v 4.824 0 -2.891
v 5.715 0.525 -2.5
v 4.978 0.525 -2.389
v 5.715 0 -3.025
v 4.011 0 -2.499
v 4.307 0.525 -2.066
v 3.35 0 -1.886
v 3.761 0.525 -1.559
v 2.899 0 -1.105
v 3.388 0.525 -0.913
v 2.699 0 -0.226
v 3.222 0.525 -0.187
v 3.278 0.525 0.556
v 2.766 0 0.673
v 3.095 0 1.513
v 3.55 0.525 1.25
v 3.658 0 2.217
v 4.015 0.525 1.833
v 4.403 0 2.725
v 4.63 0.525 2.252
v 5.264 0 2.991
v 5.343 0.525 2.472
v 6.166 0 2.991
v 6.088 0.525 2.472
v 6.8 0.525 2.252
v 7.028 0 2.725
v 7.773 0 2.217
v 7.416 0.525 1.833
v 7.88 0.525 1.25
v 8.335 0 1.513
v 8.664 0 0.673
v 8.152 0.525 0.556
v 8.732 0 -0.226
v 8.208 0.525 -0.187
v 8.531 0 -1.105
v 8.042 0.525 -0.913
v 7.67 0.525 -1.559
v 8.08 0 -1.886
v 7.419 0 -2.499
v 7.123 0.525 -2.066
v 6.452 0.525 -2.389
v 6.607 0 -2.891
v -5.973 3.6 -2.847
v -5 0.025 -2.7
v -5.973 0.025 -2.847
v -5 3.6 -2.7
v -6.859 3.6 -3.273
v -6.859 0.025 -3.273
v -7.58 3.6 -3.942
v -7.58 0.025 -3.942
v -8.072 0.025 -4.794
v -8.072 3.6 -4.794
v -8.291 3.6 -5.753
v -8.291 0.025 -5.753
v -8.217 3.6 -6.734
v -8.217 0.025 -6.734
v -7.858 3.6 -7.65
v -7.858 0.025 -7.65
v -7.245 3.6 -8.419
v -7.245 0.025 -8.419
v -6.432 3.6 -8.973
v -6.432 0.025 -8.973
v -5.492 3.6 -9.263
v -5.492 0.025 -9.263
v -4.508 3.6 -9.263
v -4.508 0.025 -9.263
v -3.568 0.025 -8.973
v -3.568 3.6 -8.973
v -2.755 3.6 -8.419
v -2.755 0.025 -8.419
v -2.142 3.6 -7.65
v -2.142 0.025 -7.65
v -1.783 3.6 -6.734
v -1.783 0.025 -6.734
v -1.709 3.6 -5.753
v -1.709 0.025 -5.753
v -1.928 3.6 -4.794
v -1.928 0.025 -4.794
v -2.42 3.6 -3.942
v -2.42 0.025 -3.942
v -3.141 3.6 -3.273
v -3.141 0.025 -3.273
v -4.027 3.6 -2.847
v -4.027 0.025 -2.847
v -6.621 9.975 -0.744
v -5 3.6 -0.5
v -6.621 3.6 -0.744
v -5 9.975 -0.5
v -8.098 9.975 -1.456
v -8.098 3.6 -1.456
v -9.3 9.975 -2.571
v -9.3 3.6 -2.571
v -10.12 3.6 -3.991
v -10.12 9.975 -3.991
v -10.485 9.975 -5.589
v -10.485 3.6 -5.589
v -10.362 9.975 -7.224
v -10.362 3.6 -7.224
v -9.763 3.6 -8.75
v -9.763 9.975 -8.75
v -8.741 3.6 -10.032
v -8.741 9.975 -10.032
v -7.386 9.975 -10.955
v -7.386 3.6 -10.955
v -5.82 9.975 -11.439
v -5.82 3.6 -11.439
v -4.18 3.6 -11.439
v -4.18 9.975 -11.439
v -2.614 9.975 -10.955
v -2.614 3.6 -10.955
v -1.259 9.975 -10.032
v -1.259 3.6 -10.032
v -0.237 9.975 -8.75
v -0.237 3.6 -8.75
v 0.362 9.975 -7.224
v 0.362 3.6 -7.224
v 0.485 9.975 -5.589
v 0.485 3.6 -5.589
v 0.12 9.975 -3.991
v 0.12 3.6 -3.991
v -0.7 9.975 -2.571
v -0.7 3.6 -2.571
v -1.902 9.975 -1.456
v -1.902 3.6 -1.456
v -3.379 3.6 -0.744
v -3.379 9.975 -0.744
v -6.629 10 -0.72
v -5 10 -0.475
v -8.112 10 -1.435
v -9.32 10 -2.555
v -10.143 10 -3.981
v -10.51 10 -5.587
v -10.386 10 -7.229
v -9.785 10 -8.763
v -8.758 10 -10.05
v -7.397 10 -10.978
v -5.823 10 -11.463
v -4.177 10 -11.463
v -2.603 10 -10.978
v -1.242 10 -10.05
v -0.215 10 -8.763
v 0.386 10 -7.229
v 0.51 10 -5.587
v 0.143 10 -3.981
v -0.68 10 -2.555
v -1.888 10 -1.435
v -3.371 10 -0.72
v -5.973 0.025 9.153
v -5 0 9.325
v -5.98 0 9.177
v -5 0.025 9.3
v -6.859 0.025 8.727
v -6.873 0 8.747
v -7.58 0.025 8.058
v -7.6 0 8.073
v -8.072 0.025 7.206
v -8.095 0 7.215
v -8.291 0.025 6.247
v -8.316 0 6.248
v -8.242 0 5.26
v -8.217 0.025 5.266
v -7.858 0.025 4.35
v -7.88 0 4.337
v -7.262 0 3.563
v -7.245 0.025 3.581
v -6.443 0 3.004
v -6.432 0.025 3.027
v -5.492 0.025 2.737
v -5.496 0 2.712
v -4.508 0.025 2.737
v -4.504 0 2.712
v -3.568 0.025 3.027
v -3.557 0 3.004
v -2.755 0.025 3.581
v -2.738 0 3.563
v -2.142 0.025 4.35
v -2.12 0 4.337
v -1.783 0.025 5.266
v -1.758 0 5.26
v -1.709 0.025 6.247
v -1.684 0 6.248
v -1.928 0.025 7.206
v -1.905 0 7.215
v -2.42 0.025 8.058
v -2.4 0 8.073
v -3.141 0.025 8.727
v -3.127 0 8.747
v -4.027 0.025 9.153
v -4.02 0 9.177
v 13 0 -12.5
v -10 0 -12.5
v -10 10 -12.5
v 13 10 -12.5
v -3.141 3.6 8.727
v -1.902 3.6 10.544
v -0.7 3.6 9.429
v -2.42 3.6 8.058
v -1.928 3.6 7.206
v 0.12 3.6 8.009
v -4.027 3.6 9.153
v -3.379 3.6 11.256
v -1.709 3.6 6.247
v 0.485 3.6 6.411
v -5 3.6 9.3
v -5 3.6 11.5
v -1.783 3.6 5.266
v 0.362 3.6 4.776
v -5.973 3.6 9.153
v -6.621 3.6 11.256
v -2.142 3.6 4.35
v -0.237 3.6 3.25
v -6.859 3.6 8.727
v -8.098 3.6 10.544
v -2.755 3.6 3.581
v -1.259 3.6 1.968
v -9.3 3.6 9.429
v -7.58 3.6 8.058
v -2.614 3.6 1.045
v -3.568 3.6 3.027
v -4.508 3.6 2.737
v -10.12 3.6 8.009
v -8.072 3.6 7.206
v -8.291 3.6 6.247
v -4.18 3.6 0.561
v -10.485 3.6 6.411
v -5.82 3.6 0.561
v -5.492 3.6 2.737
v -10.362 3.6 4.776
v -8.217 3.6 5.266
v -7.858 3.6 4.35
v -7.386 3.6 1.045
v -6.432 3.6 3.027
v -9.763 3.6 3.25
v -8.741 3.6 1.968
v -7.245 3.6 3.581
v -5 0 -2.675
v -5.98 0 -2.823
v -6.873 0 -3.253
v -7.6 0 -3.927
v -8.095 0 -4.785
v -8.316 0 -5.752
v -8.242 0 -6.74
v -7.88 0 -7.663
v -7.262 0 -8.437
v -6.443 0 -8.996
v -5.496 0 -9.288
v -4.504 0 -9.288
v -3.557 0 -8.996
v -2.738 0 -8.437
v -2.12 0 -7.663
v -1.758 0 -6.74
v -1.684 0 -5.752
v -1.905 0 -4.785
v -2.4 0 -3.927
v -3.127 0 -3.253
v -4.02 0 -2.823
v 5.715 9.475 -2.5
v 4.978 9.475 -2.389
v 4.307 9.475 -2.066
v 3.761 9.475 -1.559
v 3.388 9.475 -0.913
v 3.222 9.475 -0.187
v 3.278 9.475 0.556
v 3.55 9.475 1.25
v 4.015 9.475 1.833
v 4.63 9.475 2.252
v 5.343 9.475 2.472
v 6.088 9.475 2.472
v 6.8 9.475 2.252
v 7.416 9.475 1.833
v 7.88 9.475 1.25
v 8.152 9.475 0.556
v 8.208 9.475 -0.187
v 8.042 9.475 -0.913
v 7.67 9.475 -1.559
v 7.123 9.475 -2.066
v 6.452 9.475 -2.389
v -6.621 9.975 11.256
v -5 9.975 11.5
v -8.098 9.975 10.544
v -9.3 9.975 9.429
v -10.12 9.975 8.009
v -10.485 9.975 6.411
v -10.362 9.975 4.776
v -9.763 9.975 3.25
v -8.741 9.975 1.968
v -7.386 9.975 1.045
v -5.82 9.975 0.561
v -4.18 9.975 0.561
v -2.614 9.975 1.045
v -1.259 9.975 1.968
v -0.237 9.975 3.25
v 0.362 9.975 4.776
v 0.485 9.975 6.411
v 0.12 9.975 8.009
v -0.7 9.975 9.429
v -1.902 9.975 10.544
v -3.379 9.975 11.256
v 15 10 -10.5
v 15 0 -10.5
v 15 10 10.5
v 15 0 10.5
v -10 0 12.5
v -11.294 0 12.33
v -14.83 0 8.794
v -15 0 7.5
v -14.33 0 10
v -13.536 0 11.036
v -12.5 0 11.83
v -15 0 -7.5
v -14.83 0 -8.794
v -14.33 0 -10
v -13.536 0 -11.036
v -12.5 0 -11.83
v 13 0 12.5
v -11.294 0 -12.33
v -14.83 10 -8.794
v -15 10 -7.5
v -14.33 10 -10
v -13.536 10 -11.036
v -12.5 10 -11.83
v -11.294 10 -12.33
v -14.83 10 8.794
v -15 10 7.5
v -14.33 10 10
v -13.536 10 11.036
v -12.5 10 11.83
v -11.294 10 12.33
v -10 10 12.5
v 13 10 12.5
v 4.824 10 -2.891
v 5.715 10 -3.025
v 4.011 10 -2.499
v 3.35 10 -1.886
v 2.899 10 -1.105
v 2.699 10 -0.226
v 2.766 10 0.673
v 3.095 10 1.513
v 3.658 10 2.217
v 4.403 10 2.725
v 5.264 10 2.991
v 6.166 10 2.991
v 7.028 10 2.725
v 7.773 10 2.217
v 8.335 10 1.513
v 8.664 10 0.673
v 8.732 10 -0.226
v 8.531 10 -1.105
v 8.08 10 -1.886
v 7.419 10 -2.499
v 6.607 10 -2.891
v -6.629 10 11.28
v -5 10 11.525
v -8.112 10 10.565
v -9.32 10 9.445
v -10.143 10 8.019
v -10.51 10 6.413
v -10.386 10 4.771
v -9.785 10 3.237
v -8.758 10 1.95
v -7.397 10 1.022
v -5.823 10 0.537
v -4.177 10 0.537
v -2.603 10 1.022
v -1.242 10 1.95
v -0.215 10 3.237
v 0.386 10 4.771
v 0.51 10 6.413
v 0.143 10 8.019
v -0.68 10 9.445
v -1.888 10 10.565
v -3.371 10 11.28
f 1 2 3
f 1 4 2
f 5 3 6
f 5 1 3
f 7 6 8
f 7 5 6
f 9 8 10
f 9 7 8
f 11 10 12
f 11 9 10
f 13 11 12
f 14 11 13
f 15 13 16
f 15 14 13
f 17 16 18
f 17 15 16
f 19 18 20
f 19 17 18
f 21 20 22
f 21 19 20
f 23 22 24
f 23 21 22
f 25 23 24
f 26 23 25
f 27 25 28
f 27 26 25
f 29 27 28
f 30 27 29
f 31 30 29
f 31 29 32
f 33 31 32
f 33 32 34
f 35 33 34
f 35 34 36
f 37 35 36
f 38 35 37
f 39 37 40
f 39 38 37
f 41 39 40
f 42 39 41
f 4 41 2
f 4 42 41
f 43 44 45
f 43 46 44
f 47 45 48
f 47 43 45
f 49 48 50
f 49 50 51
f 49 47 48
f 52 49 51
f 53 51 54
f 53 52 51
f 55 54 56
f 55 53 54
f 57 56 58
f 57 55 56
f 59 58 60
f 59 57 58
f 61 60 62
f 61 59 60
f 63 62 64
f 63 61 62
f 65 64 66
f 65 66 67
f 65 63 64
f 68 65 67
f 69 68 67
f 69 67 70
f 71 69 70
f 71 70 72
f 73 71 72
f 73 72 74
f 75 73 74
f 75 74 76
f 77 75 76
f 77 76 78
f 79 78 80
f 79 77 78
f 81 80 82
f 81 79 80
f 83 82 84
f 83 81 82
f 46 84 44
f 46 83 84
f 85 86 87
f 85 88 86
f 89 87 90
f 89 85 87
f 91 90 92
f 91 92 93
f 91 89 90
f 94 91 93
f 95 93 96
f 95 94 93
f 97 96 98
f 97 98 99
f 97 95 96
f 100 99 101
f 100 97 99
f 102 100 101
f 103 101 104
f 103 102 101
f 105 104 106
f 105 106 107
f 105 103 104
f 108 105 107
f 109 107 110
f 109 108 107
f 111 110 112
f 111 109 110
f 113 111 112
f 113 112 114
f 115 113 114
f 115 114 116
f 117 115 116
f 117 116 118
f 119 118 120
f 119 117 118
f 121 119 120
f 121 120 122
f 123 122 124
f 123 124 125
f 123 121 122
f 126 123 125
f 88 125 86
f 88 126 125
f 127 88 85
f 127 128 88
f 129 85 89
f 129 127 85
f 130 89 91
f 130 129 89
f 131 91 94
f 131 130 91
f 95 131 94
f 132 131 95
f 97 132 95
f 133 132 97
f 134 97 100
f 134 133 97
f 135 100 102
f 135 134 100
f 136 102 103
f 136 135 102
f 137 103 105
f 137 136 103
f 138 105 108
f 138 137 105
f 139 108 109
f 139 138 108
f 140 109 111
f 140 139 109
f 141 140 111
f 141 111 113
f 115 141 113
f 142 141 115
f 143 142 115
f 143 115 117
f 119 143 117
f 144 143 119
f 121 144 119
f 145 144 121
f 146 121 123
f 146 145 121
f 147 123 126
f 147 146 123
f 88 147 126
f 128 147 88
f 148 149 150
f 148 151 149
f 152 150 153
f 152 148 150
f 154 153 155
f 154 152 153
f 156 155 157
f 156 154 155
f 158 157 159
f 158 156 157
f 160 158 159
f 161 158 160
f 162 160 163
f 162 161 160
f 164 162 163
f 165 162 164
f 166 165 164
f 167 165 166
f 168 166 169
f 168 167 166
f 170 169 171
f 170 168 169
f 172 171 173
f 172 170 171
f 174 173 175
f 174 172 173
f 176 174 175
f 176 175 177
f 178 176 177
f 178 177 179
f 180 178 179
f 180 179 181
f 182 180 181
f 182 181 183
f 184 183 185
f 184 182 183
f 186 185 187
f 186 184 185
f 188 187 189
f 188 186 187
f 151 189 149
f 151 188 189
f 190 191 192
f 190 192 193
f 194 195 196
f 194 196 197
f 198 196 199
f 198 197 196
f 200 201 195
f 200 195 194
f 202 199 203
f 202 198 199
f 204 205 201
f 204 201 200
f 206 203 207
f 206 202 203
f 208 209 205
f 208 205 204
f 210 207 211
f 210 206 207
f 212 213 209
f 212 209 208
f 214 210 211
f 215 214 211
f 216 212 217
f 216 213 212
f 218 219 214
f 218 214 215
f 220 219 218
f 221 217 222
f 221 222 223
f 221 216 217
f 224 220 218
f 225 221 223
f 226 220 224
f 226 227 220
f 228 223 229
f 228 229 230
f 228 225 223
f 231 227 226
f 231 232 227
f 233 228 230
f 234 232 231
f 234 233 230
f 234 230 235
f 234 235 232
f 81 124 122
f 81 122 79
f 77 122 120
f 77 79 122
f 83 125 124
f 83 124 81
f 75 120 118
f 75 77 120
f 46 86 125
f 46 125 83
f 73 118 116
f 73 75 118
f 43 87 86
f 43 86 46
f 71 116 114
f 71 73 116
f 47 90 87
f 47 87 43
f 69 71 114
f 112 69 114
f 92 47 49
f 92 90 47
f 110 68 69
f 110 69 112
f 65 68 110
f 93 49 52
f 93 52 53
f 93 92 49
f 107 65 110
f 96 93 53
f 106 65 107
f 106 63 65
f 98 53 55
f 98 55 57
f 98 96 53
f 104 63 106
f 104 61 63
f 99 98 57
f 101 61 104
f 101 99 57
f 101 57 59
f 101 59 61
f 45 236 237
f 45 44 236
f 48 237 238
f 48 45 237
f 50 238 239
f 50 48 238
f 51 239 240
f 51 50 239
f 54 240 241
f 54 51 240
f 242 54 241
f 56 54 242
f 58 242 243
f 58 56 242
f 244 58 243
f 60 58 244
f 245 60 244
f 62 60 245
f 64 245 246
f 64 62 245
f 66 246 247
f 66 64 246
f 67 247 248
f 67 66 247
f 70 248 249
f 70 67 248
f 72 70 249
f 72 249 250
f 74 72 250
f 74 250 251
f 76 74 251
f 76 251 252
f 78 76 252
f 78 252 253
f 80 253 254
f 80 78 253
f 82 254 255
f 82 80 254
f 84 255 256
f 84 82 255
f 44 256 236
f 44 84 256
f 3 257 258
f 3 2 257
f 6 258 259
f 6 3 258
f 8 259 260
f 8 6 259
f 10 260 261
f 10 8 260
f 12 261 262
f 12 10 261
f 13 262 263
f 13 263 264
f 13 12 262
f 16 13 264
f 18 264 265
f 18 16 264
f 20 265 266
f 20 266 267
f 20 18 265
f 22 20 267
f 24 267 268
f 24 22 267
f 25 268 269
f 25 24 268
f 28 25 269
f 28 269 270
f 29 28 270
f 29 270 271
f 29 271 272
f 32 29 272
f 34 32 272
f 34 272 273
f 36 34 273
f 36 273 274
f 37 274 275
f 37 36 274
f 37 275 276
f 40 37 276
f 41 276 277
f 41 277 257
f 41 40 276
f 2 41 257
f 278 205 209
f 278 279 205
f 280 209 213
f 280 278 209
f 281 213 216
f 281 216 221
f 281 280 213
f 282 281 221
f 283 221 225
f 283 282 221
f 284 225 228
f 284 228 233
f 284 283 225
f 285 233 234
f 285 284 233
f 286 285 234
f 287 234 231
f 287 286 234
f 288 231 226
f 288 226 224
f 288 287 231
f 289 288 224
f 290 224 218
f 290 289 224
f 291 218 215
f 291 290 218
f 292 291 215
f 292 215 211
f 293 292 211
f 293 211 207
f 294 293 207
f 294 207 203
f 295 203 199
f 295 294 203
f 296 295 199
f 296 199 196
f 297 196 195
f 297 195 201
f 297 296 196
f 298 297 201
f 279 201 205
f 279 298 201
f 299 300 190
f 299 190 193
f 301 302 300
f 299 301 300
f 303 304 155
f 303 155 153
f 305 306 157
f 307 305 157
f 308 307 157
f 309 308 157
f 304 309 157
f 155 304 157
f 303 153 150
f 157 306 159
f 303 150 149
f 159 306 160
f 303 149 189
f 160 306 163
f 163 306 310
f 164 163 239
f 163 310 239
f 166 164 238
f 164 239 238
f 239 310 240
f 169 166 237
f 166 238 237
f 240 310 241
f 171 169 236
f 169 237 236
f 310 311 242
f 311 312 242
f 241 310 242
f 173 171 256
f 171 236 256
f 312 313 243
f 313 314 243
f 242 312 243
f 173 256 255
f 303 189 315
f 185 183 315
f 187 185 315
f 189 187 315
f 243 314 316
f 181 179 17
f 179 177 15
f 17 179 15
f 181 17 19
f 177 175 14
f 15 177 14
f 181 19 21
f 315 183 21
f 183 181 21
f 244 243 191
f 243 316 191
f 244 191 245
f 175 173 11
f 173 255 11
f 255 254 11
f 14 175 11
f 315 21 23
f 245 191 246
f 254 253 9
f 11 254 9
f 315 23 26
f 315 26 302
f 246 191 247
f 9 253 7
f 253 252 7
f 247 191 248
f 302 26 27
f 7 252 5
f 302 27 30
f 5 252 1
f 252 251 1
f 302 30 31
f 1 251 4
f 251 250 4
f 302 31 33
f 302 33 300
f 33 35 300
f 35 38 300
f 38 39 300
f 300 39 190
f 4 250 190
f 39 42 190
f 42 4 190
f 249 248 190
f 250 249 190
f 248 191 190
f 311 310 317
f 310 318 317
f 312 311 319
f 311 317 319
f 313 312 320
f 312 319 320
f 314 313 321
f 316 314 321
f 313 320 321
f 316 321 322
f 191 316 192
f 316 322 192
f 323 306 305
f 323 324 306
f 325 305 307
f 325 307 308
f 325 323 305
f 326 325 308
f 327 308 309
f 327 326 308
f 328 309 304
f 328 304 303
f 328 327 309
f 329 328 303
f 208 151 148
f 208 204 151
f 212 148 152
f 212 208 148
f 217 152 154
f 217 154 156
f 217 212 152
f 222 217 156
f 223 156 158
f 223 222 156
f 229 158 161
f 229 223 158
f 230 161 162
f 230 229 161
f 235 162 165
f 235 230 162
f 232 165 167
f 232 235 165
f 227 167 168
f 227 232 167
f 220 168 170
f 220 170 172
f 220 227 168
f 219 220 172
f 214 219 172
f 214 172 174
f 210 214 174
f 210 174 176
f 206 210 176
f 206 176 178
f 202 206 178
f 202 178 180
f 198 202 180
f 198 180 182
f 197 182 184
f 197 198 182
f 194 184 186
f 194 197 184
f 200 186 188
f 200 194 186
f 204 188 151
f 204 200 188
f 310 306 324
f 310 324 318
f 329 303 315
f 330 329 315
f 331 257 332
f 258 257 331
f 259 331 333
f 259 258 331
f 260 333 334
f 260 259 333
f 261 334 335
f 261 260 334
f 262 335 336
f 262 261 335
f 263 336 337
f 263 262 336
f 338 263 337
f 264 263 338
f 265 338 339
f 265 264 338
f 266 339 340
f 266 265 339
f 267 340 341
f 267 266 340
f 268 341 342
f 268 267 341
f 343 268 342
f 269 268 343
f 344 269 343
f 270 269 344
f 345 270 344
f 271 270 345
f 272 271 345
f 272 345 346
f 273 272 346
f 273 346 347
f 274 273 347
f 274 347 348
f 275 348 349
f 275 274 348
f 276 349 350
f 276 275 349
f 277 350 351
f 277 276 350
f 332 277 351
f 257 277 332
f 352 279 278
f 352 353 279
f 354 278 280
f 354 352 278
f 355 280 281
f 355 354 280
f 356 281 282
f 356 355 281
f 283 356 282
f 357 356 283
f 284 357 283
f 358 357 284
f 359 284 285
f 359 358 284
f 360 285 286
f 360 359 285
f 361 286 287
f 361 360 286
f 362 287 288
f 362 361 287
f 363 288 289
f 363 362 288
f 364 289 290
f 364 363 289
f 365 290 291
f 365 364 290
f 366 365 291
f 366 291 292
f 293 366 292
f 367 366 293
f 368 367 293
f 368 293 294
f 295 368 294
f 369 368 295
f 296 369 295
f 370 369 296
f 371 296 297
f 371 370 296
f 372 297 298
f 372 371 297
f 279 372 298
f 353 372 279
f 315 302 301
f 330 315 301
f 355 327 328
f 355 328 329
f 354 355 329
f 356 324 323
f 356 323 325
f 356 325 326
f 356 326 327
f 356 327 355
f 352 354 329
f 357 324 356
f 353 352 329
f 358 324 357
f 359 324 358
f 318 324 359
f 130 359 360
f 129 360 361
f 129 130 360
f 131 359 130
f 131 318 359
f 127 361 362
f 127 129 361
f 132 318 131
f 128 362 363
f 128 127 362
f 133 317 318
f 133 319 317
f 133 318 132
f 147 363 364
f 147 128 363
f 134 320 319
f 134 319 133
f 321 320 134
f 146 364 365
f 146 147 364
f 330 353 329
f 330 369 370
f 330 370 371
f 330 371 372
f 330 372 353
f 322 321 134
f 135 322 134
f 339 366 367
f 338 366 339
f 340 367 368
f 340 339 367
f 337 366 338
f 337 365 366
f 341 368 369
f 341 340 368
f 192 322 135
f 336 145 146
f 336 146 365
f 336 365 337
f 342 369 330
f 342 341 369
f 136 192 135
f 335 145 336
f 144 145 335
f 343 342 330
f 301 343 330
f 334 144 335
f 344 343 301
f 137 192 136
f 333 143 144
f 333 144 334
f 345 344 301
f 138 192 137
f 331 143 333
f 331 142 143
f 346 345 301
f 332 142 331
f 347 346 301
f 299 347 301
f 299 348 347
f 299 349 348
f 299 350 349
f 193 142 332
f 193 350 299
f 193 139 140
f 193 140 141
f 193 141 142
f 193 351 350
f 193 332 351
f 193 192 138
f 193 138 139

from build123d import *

# Parameters (mm, degrees)
SKETCH1_W                                    = 30
SKETCH1_H                                    = 25
BOSS_EXTRUDE1_DEPTH                          = 10
FILLET1_R                                    = 5
CBORE_FOR_M6_HEX_SOCKET_HEAD_CAP_SCR_2_COUNT = 2
CBORE_FOR_M6_HEX_SOCKET_HEAD_CAP_SCR_2_PITCH = 12
CHAMFER1_SIZE                                = 2


with BuildPart() as part:
    # Sketch1 → Boss-Extrude1 (new body)
    with BuildSketch(Plane(origin=(0, 0, 0), x_dir=(1, 0, 0), z_dir=(0, 1, 0))):
        Rectangle(SKETCH1_W, SKETCH1_H)
    extrude(amount=BOSS_EXTRUDE1_DEPTH)

    # Fillet1
    fillet1_edges = [part.edges().sort_by_distance(p)[0] for p in [
        (-15, 5, -12.5),
        (-15, 5, 12.5),
    ]]
    fillet(fillet1_edges, radius=FILLET1_R)

    # Sketch3 → CBORE for M6 Hex Socket Head Cap Screw1 (revolve, cut)
    with BuildSketch(Plane(origin=(-5, 10, -6), x_dir=(0, 0, 1), z_dir=(1, 0, 0))):
        Polygon((0, 0), (0, 10), (3.325, 10), (3.3, 9.975), (3.3, 6.4), (5.5, 6.4), (5.5, 0.025), (5.525, 0), align=None)
    cbore_for_m6_hex_socket_head_cap_screw1 = revolve(axis=Axis((-5, 16.35, -6), (0, -1, 0)), mode=Mode.SUBTRACT)

    # CBORE for M6 Hex Socket Head Cap Scr 2: CBORE for M6 Hex Socket Head Cap Screw1 ×2
    with Locations(*[(0, 0, i * CBORE_FOR_M6_HEX_SOCKET_HEAD_CAP_SCR_2_PITCH) for i in range(1, CBORE_FOR_M6_HEX_SOCKET_HEAD_CAP_SCR_2_COUNT)]):
        add(cbore_for_m6_hex_socket_head_cap_screw1, mode=Mode.SUBTRACT)

    # Sketch5 → M6 Tapped Hole1 (revolve, cut)
    with BuildSketch(Plane(origin=(5.715161352, 0, 0), x_dir=(0, 0, -1), z_dir=(1, 0, 0))):
        Polygon((0, 0), (0, 10), (3.025, 10), (2.5, 9.475), (2.5, 0.525), (3.025, 0), align=None)
    revolve(axis=Axis((5.715161352, -6.35, 0), (0, 1, 0)), mode=Mode.SUBTRACT)

    # Chamfer1
    chamfer1_edges = [part.edges().sort_by_distance(p)[0] for p in [
        (15, 5, -12.5),
        (15, 5, 12.5),
    ]]
    chamfer(chamfer1_edges, length=CHAMFER1_SIZE)


solid = part.part
